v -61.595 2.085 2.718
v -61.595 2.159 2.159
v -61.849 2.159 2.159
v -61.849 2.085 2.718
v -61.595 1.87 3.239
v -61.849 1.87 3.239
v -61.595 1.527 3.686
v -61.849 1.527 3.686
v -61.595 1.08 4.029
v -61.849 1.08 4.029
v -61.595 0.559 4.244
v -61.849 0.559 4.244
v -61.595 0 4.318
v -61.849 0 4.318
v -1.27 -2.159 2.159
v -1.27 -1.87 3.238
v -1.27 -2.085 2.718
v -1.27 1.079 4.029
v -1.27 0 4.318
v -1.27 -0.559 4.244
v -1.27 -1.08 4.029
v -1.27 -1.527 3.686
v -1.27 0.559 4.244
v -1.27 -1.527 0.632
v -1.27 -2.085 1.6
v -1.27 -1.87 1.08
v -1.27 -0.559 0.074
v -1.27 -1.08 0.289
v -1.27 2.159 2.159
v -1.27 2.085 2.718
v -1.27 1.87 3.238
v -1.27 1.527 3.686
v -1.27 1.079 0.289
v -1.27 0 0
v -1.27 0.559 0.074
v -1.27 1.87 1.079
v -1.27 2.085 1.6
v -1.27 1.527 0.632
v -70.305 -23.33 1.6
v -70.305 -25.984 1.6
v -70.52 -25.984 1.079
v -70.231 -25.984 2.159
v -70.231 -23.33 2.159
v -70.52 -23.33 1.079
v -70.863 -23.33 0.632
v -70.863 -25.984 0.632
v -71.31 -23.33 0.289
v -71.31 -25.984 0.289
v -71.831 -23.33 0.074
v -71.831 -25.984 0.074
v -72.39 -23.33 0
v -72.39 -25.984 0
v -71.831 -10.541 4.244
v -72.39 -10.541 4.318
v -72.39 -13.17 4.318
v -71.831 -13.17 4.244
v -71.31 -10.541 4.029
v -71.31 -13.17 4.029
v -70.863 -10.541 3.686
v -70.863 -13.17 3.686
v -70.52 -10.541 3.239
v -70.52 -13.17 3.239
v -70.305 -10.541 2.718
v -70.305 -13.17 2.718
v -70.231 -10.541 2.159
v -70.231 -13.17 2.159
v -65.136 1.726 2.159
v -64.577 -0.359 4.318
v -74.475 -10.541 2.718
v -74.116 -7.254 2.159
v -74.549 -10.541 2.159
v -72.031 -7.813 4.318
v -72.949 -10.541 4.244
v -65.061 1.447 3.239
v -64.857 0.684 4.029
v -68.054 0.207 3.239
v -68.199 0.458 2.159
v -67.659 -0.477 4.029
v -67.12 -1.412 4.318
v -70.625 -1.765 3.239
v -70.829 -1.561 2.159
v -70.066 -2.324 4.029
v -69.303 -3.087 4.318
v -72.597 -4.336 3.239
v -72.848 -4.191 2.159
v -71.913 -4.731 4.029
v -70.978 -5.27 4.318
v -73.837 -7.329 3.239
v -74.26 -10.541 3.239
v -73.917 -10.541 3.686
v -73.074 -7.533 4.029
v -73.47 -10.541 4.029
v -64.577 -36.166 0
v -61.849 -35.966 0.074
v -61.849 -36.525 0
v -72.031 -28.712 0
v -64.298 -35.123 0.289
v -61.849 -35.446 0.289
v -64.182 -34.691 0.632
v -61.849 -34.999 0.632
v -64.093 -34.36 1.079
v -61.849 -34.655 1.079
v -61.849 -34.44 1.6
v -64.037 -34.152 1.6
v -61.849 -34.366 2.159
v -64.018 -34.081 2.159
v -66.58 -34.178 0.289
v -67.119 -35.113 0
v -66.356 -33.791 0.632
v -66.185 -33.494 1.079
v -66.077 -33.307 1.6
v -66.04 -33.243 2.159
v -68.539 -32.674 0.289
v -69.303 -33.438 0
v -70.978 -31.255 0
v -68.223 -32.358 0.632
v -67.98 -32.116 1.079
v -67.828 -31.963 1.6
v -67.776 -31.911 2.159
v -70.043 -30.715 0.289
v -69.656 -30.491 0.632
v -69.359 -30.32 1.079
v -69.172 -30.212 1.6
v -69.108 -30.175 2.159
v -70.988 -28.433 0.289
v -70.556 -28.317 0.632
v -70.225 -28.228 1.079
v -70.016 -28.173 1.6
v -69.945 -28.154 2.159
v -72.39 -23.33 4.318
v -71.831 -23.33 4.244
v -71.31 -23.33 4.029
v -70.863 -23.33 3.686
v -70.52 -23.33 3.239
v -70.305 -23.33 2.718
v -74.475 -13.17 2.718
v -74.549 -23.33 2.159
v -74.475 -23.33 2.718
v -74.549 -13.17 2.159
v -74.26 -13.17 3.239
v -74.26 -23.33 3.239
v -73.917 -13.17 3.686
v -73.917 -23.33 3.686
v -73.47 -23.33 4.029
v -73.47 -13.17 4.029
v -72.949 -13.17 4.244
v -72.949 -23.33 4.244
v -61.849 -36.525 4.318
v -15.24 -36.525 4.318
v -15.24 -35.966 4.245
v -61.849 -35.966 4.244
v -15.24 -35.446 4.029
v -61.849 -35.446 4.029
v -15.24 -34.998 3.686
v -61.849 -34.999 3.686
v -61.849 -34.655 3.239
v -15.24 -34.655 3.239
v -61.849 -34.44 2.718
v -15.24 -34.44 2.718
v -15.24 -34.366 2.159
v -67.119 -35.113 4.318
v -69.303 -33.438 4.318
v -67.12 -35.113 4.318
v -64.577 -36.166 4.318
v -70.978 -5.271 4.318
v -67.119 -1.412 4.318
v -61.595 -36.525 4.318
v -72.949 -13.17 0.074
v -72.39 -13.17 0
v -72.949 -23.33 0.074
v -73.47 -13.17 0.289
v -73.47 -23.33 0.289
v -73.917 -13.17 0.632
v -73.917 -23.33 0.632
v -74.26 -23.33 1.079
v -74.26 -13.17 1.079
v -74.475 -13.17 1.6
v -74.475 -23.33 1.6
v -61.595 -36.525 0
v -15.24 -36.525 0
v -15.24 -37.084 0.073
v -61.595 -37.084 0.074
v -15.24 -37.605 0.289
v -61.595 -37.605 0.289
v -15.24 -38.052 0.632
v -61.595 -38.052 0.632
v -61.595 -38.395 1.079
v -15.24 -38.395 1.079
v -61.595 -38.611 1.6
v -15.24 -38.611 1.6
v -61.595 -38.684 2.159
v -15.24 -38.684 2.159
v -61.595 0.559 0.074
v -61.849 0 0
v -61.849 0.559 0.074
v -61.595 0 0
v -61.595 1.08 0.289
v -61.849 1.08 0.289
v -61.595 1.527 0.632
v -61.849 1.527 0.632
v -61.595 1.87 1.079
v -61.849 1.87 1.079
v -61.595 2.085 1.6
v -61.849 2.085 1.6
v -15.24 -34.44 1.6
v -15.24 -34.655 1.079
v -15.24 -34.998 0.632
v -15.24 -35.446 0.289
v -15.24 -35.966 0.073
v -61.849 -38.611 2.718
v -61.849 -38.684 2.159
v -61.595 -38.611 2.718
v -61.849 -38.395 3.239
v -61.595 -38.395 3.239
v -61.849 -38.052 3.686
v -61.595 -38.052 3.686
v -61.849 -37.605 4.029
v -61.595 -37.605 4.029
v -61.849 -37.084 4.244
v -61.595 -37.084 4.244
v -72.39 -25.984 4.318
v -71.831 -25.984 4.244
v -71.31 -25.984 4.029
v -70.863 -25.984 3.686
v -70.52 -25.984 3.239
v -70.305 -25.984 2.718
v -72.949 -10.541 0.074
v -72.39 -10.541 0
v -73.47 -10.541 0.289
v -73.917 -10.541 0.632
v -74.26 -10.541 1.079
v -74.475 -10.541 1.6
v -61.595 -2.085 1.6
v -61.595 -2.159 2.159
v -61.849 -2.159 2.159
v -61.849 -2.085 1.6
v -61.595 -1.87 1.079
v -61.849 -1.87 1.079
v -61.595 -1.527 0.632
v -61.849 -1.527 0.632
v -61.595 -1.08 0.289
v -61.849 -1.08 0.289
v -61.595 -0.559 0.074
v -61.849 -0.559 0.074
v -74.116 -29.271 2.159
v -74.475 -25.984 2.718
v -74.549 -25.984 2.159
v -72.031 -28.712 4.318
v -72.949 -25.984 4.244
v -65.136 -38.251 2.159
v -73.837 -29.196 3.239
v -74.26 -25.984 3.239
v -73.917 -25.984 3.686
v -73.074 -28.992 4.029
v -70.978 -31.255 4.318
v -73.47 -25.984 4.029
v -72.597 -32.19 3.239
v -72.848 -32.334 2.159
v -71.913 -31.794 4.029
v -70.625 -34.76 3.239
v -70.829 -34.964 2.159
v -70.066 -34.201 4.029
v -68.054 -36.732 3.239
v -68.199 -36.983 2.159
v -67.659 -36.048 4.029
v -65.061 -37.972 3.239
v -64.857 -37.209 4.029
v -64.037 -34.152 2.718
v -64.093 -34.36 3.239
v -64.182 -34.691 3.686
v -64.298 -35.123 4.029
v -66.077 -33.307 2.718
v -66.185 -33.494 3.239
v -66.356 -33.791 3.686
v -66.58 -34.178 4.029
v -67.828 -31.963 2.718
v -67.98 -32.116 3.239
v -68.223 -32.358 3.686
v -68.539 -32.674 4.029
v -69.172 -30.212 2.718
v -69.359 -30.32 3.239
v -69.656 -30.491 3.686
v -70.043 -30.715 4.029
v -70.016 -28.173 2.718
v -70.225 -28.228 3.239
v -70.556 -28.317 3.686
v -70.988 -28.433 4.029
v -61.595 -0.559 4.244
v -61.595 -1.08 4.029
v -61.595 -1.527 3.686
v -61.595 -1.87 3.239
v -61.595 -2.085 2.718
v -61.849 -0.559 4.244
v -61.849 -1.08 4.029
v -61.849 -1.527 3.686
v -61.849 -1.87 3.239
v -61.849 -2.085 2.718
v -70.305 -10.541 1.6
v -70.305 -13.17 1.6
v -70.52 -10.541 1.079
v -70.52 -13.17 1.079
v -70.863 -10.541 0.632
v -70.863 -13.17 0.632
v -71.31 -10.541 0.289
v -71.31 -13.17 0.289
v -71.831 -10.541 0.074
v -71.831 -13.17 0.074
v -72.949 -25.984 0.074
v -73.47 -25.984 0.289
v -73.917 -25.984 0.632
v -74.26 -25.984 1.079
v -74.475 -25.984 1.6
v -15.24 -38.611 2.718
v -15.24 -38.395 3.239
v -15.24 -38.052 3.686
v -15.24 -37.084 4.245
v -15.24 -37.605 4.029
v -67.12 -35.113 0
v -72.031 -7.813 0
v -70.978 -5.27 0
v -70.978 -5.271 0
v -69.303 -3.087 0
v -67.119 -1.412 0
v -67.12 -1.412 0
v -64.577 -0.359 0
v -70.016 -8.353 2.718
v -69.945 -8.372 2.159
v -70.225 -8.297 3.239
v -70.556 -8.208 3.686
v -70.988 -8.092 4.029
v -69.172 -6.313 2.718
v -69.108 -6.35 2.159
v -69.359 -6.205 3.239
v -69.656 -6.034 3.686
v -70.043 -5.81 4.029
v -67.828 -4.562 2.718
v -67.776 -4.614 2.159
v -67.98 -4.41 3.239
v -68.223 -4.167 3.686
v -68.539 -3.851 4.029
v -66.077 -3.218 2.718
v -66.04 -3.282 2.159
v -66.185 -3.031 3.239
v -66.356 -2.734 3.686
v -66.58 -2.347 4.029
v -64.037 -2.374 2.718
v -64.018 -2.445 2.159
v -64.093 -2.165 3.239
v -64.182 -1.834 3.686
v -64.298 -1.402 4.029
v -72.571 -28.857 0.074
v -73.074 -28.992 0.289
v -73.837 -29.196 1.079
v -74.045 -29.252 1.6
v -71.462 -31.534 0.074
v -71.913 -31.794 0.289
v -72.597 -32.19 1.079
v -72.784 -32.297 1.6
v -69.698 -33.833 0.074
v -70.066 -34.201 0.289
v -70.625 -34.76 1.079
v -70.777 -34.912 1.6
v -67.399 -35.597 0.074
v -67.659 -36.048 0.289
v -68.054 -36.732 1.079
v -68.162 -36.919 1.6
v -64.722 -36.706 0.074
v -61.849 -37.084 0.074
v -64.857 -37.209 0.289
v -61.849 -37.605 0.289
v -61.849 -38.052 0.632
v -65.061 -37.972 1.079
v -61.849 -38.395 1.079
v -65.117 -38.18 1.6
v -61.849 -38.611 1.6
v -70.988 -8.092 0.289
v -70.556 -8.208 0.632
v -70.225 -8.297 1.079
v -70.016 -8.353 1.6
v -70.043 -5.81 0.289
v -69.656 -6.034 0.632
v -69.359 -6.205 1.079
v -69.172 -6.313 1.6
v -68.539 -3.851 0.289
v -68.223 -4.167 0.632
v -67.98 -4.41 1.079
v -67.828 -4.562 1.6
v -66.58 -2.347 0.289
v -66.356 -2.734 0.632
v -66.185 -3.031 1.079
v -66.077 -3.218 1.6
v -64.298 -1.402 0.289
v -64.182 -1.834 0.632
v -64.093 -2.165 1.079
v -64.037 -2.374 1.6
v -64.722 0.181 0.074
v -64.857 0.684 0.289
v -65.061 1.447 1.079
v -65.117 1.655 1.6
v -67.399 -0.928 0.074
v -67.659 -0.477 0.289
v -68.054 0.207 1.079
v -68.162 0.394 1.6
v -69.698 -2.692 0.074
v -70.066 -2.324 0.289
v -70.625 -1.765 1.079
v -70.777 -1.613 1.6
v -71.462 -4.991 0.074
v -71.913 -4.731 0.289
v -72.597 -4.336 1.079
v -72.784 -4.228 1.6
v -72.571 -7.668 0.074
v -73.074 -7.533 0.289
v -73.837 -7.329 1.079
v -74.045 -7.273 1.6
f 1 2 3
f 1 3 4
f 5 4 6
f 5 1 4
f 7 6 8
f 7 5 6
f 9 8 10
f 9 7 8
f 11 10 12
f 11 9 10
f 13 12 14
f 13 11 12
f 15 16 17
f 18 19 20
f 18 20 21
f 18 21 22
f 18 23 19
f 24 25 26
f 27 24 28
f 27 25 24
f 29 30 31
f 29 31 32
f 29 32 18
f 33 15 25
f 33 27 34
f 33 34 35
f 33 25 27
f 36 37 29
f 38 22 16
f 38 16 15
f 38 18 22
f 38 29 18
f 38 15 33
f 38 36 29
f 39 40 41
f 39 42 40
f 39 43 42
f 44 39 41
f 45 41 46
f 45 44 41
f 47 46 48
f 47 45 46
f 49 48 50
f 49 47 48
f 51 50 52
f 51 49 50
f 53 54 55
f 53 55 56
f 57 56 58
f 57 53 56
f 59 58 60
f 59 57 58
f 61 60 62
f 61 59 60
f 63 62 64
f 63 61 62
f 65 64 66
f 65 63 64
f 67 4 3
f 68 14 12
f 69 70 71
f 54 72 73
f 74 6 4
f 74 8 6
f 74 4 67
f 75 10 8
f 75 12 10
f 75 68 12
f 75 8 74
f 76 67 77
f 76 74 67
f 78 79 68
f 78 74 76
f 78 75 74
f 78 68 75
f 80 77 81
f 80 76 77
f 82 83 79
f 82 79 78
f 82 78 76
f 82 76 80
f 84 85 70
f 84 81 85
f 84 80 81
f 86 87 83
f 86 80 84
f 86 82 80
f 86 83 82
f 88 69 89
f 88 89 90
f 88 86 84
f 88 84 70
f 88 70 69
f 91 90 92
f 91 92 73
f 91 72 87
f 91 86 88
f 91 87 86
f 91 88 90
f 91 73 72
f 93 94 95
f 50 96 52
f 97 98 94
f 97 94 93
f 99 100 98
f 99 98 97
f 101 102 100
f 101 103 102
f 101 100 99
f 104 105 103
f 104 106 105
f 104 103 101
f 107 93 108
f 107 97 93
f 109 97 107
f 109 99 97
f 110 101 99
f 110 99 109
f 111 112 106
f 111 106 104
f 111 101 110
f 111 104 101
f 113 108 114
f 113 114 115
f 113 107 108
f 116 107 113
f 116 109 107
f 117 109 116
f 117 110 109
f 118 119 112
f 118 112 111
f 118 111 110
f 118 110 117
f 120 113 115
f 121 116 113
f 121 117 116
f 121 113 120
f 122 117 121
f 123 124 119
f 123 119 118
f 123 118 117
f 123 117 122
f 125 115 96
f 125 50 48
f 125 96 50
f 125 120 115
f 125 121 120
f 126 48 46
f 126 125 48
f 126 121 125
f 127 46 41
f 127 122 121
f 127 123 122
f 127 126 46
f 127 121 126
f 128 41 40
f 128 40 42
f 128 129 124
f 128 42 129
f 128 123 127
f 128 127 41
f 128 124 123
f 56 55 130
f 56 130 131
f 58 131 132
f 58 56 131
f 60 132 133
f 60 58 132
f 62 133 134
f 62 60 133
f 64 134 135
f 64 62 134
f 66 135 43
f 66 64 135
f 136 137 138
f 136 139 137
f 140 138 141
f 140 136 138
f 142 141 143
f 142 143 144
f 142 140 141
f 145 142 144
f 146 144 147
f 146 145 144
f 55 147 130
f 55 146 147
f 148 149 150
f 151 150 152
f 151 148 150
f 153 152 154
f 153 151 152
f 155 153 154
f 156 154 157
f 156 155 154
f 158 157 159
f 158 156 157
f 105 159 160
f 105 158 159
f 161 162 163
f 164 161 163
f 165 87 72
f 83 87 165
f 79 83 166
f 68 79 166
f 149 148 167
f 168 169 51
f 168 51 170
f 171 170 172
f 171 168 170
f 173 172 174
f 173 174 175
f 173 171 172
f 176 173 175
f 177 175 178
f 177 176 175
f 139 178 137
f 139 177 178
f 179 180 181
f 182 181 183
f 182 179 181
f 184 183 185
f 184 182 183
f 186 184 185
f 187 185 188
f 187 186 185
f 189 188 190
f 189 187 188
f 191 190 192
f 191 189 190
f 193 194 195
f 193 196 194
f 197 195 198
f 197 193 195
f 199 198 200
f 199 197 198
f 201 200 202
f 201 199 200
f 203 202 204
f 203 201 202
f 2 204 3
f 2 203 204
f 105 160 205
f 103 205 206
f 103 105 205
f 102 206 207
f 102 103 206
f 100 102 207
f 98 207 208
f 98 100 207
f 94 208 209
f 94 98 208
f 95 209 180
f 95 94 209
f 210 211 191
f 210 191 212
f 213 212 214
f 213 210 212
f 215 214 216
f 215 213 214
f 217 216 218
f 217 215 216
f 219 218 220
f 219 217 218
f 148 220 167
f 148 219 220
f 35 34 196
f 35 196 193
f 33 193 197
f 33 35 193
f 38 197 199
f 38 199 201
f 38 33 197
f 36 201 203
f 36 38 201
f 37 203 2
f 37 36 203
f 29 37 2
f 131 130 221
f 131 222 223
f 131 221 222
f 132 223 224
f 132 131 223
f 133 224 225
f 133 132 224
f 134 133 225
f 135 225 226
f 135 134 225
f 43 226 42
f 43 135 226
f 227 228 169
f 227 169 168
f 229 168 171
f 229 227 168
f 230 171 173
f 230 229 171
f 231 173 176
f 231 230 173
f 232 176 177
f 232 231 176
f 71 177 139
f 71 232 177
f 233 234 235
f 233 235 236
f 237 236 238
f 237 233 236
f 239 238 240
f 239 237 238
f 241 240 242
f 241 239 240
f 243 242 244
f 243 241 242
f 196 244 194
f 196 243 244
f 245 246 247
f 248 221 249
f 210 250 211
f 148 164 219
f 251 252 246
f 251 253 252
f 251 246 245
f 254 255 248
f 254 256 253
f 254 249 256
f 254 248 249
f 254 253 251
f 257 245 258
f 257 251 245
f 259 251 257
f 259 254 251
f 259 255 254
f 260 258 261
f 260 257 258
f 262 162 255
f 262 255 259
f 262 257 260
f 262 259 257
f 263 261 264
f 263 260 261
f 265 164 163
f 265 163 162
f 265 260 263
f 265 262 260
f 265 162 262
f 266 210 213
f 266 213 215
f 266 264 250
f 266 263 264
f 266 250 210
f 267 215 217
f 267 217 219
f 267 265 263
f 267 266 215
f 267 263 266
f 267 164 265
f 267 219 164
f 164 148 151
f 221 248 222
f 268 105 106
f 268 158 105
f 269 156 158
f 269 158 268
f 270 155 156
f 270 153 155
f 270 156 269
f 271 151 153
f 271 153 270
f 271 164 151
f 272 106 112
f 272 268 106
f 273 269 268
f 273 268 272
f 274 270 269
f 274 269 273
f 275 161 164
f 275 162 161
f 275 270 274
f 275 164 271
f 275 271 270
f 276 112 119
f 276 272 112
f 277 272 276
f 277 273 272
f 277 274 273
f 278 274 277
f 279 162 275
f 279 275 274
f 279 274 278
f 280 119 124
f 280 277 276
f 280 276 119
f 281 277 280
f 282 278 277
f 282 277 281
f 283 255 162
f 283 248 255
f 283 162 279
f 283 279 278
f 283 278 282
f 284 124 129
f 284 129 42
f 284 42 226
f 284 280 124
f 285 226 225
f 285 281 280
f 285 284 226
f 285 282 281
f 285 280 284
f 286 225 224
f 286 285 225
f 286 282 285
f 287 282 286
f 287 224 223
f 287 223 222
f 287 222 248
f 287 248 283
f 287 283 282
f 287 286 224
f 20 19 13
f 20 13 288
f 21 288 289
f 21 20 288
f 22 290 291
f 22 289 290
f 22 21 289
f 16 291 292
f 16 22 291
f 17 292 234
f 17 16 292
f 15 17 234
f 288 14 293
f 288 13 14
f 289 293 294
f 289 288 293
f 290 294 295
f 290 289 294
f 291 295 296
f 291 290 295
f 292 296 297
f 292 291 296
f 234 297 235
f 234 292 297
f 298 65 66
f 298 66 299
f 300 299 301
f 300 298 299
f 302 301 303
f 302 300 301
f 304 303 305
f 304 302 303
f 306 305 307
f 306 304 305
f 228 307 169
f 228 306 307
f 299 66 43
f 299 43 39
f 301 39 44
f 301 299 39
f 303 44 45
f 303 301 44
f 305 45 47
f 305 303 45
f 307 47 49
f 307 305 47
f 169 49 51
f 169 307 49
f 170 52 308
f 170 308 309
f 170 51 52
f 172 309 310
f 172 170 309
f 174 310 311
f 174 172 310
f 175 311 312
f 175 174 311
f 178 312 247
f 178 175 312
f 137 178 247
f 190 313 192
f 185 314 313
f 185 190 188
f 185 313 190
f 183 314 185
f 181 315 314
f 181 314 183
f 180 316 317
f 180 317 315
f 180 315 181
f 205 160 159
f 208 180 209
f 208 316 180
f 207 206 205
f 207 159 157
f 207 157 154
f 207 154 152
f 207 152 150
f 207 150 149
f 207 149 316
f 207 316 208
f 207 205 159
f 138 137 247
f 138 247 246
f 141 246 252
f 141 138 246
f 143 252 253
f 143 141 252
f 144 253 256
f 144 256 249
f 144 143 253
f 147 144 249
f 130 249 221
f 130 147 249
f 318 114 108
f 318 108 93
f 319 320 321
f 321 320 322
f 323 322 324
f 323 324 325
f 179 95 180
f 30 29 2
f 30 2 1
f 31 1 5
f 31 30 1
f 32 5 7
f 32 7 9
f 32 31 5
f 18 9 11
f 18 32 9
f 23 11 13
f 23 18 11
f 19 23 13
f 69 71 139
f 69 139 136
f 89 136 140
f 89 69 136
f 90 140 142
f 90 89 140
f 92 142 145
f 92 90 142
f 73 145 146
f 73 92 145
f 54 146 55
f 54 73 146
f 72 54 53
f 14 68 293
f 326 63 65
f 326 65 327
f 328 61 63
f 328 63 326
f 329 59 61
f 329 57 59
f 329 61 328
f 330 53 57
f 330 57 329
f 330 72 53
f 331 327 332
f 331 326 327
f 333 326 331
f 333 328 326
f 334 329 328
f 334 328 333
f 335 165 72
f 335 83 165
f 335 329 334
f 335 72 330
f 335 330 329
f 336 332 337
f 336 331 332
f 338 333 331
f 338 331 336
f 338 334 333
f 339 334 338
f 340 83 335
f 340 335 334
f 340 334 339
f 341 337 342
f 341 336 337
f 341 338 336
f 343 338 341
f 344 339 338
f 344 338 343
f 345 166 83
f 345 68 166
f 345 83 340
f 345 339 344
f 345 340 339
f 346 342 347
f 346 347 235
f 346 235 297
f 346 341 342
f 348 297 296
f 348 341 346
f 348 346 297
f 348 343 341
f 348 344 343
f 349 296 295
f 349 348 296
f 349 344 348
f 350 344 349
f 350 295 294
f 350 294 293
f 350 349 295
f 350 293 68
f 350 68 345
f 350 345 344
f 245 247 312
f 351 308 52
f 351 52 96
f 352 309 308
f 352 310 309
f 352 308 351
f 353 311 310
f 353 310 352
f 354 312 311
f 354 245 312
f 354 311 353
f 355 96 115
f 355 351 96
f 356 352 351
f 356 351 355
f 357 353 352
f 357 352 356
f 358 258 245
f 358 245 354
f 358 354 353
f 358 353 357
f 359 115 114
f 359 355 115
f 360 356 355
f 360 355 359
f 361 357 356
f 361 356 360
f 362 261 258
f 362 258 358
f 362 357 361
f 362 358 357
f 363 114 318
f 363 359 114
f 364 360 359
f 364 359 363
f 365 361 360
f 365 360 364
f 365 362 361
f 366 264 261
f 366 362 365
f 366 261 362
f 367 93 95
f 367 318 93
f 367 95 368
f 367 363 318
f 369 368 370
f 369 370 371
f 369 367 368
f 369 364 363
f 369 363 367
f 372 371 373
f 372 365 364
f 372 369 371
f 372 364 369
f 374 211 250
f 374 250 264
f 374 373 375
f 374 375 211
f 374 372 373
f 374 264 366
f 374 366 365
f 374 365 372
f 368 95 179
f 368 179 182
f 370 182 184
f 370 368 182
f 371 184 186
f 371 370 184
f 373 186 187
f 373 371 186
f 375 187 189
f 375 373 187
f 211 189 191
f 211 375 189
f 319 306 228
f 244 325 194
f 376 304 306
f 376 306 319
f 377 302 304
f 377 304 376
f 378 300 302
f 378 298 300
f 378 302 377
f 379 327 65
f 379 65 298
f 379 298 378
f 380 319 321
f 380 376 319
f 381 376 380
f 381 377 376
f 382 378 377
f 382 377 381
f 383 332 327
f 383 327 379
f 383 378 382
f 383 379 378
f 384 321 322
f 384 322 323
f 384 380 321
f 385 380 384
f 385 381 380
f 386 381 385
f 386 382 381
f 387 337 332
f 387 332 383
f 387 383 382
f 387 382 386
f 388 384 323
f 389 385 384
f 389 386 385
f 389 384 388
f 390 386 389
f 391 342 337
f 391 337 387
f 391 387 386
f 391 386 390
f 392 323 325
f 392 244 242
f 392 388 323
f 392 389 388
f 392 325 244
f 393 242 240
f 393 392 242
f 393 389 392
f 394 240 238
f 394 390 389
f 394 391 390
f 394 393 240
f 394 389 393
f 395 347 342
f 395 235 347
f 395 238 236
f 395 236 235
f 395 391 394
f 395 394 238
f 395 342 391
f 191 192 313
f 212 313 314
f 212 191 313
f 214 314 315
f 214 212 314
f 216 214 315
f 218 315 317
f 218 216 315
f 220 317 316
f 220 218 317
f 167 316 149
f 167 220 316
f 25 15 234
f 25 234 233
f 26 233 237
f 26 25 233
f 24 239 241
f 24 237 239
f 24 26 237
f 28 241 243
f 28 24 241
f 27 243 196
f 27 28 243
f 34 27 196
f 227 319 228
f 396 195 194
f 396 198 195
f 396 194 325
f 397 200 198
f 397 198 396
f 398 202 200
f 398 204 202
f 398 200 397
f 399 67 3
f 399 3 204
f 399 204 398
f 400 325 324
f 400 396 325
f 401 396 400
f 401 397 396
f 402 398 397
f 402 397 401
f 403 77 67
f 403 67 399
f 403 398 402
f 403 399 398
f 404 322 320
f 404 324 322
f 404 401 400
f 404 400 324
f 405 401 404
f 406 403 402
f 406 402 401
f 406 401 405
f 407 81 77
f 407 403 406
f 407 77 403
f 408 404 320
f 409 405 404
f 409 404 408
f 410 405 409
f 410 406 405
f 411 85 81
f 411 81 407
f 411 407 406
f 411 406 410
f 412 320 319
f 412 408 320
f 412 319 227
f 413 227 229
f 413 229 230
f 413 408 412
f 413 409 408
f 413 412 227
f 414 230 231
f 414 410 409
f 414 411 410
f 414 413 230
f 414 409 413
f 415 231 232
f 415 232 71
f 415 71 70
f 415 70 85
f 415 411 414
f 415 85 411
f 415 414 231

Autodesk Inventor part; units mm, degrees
ref_plane "YZ Plane" through (0, 0, 0) normal (1, 0, 0) x (0, 1, 0)
ref_plane "XZ Plane" through (0, 0, 0) normal (0, 1, 0) x (-1, 0, 0)
ref_plane "XY Plane" through (0, 0, 0) normal (0, 0, 1) x (1, 0, 0)
sketch "Sketch1" plane through (0, 0, 0) normal (0, 0, 1) x (1, 0, 0)
  line L0 (0, 2.159) -> (0, -2.159)
  line L1 (0, -2.159) -> (-61.595, -2.159)
  line L2 (0, 2.159) -> (-61.595, 2.159)
  line L3 (-61.595, -38.6842) -> (-14.4526, -38.6842)
  line L4 (-70.231, -13.1699) -> (-70.231, -23.3299)
  line L5 (-74.549, -13.1699) -> (-74.549, -23.3299)
  line L6 (-70.231, -13.1699) -> (-70.231, -2.159)
  line L7 (-70.231, -2.159) -> (-61.595, -2.159)
  line L8 (-61.595, 2.159) -> (-74.549, 2.159)
  line L9 (-74.549, 2.159) -> (-74.549, -13.1699)
  line L10 (-74.549, -23.3299) -> (-74.549, -38.6842)
  line L11 (-74.549, -38.6842) -> (-61.595, -38.6842)
  line L12 (-14.4526, -34.3662) -> (-14.4526, -36.5252)
  line L13 (-14.4526, -36.5252) -> (-14.4526, -38.6842)
  line L14 (-14.4526, -34.3662) -> (-70.231, -34.3662)
  line L15 (-70.231, -34.3662) -> (-70.231, -23.3299)
  point P0 (0, 0)
  point P1 (0, 0)
  point P2 (-61.595, 0)
  point P3 (-72.39, -18.2499)
  point P4 (-72.39, -13.1699)
  point P5 (-72.39, -23.3299)
  dimension "d0" = 61.595
  dimension "d1" = 18.2499
  dimension "d2" = 10.795
  dimension "d3" = 5.08
  dimension "d4" = 5.08
  dimension "d8" = 2.159
  dimension "d9" = 2.159
  dimension "d14" = 2.159
  dimension "d15" = 2.159
  dimension "d34" = 2.159
  dimension "d35" = 47.1424
  dimension "d36" = 36.5252
extrude "Extrusion1" add sketch "Sketch1" along normal blind 4.318
fillet "Fillet10" radius 12.7 2 edges at (-74.549, 2.159, 2.159) (-74.549, -38.6842, 2.159)
fillet "Fillet11" radius 8.382 2 edges at (-70.231, -34.3662, 2.159) (-70.231, -2.159, 2.159)
fillet "Fillet12" radius 2.159 20 edges at (-70.8293, -1.5607, 0) (-74.549, -18.2499, 0) (-70.8293, -34.9645, 0) (-38.0238, -38.6842, 0) (-30.7975, 2.159, 0) (-70.8293, -1.5607, 4.318) (-74.549, -18.2499, 4.318) (-70.8293, -34.9645, 4.318) (-38.0238, -38.6842, 4.318) (-61.722, 2.159, 4.318) (-67.776, -31.9112, 4.318) (-70.231, -18.2499, 4.318) (-67.776, -4.614, 4.318) (-30.7975, -2.159, 4.318) (-38.1508, -34.3662, 4.318) (-67.776, -31.9112, 0) (-70.231, -18.2499, 0) (-67.776, -4.614, 0) (-30.7975, -2.159, 0) (-38.1508, -34.3662, 0)
sketch "Sketch5" plane through (0, 0, 2.159) normal (1, 0, 0) x (0, 0, -1)
  circle A0 centre (0, 0) radius 2.159
  point P0 (2.159, 0)
extrude "Extrusion5" cut sketch "Sketch5" against normal blind 1.27
sketch "Sketch6" plane through (-14.4526, -36.5252, 2.159) normal (1, 0, 0) x (0, 0, -1)
  circle A0 centre (0, 0) radius 2.1591
  point P0 (2.159, 36.5252)
extrude "Extrusion6" cut sketch "Sketch6" against normal blind 0.7874
properties part number "Water_tube" material "Water"
